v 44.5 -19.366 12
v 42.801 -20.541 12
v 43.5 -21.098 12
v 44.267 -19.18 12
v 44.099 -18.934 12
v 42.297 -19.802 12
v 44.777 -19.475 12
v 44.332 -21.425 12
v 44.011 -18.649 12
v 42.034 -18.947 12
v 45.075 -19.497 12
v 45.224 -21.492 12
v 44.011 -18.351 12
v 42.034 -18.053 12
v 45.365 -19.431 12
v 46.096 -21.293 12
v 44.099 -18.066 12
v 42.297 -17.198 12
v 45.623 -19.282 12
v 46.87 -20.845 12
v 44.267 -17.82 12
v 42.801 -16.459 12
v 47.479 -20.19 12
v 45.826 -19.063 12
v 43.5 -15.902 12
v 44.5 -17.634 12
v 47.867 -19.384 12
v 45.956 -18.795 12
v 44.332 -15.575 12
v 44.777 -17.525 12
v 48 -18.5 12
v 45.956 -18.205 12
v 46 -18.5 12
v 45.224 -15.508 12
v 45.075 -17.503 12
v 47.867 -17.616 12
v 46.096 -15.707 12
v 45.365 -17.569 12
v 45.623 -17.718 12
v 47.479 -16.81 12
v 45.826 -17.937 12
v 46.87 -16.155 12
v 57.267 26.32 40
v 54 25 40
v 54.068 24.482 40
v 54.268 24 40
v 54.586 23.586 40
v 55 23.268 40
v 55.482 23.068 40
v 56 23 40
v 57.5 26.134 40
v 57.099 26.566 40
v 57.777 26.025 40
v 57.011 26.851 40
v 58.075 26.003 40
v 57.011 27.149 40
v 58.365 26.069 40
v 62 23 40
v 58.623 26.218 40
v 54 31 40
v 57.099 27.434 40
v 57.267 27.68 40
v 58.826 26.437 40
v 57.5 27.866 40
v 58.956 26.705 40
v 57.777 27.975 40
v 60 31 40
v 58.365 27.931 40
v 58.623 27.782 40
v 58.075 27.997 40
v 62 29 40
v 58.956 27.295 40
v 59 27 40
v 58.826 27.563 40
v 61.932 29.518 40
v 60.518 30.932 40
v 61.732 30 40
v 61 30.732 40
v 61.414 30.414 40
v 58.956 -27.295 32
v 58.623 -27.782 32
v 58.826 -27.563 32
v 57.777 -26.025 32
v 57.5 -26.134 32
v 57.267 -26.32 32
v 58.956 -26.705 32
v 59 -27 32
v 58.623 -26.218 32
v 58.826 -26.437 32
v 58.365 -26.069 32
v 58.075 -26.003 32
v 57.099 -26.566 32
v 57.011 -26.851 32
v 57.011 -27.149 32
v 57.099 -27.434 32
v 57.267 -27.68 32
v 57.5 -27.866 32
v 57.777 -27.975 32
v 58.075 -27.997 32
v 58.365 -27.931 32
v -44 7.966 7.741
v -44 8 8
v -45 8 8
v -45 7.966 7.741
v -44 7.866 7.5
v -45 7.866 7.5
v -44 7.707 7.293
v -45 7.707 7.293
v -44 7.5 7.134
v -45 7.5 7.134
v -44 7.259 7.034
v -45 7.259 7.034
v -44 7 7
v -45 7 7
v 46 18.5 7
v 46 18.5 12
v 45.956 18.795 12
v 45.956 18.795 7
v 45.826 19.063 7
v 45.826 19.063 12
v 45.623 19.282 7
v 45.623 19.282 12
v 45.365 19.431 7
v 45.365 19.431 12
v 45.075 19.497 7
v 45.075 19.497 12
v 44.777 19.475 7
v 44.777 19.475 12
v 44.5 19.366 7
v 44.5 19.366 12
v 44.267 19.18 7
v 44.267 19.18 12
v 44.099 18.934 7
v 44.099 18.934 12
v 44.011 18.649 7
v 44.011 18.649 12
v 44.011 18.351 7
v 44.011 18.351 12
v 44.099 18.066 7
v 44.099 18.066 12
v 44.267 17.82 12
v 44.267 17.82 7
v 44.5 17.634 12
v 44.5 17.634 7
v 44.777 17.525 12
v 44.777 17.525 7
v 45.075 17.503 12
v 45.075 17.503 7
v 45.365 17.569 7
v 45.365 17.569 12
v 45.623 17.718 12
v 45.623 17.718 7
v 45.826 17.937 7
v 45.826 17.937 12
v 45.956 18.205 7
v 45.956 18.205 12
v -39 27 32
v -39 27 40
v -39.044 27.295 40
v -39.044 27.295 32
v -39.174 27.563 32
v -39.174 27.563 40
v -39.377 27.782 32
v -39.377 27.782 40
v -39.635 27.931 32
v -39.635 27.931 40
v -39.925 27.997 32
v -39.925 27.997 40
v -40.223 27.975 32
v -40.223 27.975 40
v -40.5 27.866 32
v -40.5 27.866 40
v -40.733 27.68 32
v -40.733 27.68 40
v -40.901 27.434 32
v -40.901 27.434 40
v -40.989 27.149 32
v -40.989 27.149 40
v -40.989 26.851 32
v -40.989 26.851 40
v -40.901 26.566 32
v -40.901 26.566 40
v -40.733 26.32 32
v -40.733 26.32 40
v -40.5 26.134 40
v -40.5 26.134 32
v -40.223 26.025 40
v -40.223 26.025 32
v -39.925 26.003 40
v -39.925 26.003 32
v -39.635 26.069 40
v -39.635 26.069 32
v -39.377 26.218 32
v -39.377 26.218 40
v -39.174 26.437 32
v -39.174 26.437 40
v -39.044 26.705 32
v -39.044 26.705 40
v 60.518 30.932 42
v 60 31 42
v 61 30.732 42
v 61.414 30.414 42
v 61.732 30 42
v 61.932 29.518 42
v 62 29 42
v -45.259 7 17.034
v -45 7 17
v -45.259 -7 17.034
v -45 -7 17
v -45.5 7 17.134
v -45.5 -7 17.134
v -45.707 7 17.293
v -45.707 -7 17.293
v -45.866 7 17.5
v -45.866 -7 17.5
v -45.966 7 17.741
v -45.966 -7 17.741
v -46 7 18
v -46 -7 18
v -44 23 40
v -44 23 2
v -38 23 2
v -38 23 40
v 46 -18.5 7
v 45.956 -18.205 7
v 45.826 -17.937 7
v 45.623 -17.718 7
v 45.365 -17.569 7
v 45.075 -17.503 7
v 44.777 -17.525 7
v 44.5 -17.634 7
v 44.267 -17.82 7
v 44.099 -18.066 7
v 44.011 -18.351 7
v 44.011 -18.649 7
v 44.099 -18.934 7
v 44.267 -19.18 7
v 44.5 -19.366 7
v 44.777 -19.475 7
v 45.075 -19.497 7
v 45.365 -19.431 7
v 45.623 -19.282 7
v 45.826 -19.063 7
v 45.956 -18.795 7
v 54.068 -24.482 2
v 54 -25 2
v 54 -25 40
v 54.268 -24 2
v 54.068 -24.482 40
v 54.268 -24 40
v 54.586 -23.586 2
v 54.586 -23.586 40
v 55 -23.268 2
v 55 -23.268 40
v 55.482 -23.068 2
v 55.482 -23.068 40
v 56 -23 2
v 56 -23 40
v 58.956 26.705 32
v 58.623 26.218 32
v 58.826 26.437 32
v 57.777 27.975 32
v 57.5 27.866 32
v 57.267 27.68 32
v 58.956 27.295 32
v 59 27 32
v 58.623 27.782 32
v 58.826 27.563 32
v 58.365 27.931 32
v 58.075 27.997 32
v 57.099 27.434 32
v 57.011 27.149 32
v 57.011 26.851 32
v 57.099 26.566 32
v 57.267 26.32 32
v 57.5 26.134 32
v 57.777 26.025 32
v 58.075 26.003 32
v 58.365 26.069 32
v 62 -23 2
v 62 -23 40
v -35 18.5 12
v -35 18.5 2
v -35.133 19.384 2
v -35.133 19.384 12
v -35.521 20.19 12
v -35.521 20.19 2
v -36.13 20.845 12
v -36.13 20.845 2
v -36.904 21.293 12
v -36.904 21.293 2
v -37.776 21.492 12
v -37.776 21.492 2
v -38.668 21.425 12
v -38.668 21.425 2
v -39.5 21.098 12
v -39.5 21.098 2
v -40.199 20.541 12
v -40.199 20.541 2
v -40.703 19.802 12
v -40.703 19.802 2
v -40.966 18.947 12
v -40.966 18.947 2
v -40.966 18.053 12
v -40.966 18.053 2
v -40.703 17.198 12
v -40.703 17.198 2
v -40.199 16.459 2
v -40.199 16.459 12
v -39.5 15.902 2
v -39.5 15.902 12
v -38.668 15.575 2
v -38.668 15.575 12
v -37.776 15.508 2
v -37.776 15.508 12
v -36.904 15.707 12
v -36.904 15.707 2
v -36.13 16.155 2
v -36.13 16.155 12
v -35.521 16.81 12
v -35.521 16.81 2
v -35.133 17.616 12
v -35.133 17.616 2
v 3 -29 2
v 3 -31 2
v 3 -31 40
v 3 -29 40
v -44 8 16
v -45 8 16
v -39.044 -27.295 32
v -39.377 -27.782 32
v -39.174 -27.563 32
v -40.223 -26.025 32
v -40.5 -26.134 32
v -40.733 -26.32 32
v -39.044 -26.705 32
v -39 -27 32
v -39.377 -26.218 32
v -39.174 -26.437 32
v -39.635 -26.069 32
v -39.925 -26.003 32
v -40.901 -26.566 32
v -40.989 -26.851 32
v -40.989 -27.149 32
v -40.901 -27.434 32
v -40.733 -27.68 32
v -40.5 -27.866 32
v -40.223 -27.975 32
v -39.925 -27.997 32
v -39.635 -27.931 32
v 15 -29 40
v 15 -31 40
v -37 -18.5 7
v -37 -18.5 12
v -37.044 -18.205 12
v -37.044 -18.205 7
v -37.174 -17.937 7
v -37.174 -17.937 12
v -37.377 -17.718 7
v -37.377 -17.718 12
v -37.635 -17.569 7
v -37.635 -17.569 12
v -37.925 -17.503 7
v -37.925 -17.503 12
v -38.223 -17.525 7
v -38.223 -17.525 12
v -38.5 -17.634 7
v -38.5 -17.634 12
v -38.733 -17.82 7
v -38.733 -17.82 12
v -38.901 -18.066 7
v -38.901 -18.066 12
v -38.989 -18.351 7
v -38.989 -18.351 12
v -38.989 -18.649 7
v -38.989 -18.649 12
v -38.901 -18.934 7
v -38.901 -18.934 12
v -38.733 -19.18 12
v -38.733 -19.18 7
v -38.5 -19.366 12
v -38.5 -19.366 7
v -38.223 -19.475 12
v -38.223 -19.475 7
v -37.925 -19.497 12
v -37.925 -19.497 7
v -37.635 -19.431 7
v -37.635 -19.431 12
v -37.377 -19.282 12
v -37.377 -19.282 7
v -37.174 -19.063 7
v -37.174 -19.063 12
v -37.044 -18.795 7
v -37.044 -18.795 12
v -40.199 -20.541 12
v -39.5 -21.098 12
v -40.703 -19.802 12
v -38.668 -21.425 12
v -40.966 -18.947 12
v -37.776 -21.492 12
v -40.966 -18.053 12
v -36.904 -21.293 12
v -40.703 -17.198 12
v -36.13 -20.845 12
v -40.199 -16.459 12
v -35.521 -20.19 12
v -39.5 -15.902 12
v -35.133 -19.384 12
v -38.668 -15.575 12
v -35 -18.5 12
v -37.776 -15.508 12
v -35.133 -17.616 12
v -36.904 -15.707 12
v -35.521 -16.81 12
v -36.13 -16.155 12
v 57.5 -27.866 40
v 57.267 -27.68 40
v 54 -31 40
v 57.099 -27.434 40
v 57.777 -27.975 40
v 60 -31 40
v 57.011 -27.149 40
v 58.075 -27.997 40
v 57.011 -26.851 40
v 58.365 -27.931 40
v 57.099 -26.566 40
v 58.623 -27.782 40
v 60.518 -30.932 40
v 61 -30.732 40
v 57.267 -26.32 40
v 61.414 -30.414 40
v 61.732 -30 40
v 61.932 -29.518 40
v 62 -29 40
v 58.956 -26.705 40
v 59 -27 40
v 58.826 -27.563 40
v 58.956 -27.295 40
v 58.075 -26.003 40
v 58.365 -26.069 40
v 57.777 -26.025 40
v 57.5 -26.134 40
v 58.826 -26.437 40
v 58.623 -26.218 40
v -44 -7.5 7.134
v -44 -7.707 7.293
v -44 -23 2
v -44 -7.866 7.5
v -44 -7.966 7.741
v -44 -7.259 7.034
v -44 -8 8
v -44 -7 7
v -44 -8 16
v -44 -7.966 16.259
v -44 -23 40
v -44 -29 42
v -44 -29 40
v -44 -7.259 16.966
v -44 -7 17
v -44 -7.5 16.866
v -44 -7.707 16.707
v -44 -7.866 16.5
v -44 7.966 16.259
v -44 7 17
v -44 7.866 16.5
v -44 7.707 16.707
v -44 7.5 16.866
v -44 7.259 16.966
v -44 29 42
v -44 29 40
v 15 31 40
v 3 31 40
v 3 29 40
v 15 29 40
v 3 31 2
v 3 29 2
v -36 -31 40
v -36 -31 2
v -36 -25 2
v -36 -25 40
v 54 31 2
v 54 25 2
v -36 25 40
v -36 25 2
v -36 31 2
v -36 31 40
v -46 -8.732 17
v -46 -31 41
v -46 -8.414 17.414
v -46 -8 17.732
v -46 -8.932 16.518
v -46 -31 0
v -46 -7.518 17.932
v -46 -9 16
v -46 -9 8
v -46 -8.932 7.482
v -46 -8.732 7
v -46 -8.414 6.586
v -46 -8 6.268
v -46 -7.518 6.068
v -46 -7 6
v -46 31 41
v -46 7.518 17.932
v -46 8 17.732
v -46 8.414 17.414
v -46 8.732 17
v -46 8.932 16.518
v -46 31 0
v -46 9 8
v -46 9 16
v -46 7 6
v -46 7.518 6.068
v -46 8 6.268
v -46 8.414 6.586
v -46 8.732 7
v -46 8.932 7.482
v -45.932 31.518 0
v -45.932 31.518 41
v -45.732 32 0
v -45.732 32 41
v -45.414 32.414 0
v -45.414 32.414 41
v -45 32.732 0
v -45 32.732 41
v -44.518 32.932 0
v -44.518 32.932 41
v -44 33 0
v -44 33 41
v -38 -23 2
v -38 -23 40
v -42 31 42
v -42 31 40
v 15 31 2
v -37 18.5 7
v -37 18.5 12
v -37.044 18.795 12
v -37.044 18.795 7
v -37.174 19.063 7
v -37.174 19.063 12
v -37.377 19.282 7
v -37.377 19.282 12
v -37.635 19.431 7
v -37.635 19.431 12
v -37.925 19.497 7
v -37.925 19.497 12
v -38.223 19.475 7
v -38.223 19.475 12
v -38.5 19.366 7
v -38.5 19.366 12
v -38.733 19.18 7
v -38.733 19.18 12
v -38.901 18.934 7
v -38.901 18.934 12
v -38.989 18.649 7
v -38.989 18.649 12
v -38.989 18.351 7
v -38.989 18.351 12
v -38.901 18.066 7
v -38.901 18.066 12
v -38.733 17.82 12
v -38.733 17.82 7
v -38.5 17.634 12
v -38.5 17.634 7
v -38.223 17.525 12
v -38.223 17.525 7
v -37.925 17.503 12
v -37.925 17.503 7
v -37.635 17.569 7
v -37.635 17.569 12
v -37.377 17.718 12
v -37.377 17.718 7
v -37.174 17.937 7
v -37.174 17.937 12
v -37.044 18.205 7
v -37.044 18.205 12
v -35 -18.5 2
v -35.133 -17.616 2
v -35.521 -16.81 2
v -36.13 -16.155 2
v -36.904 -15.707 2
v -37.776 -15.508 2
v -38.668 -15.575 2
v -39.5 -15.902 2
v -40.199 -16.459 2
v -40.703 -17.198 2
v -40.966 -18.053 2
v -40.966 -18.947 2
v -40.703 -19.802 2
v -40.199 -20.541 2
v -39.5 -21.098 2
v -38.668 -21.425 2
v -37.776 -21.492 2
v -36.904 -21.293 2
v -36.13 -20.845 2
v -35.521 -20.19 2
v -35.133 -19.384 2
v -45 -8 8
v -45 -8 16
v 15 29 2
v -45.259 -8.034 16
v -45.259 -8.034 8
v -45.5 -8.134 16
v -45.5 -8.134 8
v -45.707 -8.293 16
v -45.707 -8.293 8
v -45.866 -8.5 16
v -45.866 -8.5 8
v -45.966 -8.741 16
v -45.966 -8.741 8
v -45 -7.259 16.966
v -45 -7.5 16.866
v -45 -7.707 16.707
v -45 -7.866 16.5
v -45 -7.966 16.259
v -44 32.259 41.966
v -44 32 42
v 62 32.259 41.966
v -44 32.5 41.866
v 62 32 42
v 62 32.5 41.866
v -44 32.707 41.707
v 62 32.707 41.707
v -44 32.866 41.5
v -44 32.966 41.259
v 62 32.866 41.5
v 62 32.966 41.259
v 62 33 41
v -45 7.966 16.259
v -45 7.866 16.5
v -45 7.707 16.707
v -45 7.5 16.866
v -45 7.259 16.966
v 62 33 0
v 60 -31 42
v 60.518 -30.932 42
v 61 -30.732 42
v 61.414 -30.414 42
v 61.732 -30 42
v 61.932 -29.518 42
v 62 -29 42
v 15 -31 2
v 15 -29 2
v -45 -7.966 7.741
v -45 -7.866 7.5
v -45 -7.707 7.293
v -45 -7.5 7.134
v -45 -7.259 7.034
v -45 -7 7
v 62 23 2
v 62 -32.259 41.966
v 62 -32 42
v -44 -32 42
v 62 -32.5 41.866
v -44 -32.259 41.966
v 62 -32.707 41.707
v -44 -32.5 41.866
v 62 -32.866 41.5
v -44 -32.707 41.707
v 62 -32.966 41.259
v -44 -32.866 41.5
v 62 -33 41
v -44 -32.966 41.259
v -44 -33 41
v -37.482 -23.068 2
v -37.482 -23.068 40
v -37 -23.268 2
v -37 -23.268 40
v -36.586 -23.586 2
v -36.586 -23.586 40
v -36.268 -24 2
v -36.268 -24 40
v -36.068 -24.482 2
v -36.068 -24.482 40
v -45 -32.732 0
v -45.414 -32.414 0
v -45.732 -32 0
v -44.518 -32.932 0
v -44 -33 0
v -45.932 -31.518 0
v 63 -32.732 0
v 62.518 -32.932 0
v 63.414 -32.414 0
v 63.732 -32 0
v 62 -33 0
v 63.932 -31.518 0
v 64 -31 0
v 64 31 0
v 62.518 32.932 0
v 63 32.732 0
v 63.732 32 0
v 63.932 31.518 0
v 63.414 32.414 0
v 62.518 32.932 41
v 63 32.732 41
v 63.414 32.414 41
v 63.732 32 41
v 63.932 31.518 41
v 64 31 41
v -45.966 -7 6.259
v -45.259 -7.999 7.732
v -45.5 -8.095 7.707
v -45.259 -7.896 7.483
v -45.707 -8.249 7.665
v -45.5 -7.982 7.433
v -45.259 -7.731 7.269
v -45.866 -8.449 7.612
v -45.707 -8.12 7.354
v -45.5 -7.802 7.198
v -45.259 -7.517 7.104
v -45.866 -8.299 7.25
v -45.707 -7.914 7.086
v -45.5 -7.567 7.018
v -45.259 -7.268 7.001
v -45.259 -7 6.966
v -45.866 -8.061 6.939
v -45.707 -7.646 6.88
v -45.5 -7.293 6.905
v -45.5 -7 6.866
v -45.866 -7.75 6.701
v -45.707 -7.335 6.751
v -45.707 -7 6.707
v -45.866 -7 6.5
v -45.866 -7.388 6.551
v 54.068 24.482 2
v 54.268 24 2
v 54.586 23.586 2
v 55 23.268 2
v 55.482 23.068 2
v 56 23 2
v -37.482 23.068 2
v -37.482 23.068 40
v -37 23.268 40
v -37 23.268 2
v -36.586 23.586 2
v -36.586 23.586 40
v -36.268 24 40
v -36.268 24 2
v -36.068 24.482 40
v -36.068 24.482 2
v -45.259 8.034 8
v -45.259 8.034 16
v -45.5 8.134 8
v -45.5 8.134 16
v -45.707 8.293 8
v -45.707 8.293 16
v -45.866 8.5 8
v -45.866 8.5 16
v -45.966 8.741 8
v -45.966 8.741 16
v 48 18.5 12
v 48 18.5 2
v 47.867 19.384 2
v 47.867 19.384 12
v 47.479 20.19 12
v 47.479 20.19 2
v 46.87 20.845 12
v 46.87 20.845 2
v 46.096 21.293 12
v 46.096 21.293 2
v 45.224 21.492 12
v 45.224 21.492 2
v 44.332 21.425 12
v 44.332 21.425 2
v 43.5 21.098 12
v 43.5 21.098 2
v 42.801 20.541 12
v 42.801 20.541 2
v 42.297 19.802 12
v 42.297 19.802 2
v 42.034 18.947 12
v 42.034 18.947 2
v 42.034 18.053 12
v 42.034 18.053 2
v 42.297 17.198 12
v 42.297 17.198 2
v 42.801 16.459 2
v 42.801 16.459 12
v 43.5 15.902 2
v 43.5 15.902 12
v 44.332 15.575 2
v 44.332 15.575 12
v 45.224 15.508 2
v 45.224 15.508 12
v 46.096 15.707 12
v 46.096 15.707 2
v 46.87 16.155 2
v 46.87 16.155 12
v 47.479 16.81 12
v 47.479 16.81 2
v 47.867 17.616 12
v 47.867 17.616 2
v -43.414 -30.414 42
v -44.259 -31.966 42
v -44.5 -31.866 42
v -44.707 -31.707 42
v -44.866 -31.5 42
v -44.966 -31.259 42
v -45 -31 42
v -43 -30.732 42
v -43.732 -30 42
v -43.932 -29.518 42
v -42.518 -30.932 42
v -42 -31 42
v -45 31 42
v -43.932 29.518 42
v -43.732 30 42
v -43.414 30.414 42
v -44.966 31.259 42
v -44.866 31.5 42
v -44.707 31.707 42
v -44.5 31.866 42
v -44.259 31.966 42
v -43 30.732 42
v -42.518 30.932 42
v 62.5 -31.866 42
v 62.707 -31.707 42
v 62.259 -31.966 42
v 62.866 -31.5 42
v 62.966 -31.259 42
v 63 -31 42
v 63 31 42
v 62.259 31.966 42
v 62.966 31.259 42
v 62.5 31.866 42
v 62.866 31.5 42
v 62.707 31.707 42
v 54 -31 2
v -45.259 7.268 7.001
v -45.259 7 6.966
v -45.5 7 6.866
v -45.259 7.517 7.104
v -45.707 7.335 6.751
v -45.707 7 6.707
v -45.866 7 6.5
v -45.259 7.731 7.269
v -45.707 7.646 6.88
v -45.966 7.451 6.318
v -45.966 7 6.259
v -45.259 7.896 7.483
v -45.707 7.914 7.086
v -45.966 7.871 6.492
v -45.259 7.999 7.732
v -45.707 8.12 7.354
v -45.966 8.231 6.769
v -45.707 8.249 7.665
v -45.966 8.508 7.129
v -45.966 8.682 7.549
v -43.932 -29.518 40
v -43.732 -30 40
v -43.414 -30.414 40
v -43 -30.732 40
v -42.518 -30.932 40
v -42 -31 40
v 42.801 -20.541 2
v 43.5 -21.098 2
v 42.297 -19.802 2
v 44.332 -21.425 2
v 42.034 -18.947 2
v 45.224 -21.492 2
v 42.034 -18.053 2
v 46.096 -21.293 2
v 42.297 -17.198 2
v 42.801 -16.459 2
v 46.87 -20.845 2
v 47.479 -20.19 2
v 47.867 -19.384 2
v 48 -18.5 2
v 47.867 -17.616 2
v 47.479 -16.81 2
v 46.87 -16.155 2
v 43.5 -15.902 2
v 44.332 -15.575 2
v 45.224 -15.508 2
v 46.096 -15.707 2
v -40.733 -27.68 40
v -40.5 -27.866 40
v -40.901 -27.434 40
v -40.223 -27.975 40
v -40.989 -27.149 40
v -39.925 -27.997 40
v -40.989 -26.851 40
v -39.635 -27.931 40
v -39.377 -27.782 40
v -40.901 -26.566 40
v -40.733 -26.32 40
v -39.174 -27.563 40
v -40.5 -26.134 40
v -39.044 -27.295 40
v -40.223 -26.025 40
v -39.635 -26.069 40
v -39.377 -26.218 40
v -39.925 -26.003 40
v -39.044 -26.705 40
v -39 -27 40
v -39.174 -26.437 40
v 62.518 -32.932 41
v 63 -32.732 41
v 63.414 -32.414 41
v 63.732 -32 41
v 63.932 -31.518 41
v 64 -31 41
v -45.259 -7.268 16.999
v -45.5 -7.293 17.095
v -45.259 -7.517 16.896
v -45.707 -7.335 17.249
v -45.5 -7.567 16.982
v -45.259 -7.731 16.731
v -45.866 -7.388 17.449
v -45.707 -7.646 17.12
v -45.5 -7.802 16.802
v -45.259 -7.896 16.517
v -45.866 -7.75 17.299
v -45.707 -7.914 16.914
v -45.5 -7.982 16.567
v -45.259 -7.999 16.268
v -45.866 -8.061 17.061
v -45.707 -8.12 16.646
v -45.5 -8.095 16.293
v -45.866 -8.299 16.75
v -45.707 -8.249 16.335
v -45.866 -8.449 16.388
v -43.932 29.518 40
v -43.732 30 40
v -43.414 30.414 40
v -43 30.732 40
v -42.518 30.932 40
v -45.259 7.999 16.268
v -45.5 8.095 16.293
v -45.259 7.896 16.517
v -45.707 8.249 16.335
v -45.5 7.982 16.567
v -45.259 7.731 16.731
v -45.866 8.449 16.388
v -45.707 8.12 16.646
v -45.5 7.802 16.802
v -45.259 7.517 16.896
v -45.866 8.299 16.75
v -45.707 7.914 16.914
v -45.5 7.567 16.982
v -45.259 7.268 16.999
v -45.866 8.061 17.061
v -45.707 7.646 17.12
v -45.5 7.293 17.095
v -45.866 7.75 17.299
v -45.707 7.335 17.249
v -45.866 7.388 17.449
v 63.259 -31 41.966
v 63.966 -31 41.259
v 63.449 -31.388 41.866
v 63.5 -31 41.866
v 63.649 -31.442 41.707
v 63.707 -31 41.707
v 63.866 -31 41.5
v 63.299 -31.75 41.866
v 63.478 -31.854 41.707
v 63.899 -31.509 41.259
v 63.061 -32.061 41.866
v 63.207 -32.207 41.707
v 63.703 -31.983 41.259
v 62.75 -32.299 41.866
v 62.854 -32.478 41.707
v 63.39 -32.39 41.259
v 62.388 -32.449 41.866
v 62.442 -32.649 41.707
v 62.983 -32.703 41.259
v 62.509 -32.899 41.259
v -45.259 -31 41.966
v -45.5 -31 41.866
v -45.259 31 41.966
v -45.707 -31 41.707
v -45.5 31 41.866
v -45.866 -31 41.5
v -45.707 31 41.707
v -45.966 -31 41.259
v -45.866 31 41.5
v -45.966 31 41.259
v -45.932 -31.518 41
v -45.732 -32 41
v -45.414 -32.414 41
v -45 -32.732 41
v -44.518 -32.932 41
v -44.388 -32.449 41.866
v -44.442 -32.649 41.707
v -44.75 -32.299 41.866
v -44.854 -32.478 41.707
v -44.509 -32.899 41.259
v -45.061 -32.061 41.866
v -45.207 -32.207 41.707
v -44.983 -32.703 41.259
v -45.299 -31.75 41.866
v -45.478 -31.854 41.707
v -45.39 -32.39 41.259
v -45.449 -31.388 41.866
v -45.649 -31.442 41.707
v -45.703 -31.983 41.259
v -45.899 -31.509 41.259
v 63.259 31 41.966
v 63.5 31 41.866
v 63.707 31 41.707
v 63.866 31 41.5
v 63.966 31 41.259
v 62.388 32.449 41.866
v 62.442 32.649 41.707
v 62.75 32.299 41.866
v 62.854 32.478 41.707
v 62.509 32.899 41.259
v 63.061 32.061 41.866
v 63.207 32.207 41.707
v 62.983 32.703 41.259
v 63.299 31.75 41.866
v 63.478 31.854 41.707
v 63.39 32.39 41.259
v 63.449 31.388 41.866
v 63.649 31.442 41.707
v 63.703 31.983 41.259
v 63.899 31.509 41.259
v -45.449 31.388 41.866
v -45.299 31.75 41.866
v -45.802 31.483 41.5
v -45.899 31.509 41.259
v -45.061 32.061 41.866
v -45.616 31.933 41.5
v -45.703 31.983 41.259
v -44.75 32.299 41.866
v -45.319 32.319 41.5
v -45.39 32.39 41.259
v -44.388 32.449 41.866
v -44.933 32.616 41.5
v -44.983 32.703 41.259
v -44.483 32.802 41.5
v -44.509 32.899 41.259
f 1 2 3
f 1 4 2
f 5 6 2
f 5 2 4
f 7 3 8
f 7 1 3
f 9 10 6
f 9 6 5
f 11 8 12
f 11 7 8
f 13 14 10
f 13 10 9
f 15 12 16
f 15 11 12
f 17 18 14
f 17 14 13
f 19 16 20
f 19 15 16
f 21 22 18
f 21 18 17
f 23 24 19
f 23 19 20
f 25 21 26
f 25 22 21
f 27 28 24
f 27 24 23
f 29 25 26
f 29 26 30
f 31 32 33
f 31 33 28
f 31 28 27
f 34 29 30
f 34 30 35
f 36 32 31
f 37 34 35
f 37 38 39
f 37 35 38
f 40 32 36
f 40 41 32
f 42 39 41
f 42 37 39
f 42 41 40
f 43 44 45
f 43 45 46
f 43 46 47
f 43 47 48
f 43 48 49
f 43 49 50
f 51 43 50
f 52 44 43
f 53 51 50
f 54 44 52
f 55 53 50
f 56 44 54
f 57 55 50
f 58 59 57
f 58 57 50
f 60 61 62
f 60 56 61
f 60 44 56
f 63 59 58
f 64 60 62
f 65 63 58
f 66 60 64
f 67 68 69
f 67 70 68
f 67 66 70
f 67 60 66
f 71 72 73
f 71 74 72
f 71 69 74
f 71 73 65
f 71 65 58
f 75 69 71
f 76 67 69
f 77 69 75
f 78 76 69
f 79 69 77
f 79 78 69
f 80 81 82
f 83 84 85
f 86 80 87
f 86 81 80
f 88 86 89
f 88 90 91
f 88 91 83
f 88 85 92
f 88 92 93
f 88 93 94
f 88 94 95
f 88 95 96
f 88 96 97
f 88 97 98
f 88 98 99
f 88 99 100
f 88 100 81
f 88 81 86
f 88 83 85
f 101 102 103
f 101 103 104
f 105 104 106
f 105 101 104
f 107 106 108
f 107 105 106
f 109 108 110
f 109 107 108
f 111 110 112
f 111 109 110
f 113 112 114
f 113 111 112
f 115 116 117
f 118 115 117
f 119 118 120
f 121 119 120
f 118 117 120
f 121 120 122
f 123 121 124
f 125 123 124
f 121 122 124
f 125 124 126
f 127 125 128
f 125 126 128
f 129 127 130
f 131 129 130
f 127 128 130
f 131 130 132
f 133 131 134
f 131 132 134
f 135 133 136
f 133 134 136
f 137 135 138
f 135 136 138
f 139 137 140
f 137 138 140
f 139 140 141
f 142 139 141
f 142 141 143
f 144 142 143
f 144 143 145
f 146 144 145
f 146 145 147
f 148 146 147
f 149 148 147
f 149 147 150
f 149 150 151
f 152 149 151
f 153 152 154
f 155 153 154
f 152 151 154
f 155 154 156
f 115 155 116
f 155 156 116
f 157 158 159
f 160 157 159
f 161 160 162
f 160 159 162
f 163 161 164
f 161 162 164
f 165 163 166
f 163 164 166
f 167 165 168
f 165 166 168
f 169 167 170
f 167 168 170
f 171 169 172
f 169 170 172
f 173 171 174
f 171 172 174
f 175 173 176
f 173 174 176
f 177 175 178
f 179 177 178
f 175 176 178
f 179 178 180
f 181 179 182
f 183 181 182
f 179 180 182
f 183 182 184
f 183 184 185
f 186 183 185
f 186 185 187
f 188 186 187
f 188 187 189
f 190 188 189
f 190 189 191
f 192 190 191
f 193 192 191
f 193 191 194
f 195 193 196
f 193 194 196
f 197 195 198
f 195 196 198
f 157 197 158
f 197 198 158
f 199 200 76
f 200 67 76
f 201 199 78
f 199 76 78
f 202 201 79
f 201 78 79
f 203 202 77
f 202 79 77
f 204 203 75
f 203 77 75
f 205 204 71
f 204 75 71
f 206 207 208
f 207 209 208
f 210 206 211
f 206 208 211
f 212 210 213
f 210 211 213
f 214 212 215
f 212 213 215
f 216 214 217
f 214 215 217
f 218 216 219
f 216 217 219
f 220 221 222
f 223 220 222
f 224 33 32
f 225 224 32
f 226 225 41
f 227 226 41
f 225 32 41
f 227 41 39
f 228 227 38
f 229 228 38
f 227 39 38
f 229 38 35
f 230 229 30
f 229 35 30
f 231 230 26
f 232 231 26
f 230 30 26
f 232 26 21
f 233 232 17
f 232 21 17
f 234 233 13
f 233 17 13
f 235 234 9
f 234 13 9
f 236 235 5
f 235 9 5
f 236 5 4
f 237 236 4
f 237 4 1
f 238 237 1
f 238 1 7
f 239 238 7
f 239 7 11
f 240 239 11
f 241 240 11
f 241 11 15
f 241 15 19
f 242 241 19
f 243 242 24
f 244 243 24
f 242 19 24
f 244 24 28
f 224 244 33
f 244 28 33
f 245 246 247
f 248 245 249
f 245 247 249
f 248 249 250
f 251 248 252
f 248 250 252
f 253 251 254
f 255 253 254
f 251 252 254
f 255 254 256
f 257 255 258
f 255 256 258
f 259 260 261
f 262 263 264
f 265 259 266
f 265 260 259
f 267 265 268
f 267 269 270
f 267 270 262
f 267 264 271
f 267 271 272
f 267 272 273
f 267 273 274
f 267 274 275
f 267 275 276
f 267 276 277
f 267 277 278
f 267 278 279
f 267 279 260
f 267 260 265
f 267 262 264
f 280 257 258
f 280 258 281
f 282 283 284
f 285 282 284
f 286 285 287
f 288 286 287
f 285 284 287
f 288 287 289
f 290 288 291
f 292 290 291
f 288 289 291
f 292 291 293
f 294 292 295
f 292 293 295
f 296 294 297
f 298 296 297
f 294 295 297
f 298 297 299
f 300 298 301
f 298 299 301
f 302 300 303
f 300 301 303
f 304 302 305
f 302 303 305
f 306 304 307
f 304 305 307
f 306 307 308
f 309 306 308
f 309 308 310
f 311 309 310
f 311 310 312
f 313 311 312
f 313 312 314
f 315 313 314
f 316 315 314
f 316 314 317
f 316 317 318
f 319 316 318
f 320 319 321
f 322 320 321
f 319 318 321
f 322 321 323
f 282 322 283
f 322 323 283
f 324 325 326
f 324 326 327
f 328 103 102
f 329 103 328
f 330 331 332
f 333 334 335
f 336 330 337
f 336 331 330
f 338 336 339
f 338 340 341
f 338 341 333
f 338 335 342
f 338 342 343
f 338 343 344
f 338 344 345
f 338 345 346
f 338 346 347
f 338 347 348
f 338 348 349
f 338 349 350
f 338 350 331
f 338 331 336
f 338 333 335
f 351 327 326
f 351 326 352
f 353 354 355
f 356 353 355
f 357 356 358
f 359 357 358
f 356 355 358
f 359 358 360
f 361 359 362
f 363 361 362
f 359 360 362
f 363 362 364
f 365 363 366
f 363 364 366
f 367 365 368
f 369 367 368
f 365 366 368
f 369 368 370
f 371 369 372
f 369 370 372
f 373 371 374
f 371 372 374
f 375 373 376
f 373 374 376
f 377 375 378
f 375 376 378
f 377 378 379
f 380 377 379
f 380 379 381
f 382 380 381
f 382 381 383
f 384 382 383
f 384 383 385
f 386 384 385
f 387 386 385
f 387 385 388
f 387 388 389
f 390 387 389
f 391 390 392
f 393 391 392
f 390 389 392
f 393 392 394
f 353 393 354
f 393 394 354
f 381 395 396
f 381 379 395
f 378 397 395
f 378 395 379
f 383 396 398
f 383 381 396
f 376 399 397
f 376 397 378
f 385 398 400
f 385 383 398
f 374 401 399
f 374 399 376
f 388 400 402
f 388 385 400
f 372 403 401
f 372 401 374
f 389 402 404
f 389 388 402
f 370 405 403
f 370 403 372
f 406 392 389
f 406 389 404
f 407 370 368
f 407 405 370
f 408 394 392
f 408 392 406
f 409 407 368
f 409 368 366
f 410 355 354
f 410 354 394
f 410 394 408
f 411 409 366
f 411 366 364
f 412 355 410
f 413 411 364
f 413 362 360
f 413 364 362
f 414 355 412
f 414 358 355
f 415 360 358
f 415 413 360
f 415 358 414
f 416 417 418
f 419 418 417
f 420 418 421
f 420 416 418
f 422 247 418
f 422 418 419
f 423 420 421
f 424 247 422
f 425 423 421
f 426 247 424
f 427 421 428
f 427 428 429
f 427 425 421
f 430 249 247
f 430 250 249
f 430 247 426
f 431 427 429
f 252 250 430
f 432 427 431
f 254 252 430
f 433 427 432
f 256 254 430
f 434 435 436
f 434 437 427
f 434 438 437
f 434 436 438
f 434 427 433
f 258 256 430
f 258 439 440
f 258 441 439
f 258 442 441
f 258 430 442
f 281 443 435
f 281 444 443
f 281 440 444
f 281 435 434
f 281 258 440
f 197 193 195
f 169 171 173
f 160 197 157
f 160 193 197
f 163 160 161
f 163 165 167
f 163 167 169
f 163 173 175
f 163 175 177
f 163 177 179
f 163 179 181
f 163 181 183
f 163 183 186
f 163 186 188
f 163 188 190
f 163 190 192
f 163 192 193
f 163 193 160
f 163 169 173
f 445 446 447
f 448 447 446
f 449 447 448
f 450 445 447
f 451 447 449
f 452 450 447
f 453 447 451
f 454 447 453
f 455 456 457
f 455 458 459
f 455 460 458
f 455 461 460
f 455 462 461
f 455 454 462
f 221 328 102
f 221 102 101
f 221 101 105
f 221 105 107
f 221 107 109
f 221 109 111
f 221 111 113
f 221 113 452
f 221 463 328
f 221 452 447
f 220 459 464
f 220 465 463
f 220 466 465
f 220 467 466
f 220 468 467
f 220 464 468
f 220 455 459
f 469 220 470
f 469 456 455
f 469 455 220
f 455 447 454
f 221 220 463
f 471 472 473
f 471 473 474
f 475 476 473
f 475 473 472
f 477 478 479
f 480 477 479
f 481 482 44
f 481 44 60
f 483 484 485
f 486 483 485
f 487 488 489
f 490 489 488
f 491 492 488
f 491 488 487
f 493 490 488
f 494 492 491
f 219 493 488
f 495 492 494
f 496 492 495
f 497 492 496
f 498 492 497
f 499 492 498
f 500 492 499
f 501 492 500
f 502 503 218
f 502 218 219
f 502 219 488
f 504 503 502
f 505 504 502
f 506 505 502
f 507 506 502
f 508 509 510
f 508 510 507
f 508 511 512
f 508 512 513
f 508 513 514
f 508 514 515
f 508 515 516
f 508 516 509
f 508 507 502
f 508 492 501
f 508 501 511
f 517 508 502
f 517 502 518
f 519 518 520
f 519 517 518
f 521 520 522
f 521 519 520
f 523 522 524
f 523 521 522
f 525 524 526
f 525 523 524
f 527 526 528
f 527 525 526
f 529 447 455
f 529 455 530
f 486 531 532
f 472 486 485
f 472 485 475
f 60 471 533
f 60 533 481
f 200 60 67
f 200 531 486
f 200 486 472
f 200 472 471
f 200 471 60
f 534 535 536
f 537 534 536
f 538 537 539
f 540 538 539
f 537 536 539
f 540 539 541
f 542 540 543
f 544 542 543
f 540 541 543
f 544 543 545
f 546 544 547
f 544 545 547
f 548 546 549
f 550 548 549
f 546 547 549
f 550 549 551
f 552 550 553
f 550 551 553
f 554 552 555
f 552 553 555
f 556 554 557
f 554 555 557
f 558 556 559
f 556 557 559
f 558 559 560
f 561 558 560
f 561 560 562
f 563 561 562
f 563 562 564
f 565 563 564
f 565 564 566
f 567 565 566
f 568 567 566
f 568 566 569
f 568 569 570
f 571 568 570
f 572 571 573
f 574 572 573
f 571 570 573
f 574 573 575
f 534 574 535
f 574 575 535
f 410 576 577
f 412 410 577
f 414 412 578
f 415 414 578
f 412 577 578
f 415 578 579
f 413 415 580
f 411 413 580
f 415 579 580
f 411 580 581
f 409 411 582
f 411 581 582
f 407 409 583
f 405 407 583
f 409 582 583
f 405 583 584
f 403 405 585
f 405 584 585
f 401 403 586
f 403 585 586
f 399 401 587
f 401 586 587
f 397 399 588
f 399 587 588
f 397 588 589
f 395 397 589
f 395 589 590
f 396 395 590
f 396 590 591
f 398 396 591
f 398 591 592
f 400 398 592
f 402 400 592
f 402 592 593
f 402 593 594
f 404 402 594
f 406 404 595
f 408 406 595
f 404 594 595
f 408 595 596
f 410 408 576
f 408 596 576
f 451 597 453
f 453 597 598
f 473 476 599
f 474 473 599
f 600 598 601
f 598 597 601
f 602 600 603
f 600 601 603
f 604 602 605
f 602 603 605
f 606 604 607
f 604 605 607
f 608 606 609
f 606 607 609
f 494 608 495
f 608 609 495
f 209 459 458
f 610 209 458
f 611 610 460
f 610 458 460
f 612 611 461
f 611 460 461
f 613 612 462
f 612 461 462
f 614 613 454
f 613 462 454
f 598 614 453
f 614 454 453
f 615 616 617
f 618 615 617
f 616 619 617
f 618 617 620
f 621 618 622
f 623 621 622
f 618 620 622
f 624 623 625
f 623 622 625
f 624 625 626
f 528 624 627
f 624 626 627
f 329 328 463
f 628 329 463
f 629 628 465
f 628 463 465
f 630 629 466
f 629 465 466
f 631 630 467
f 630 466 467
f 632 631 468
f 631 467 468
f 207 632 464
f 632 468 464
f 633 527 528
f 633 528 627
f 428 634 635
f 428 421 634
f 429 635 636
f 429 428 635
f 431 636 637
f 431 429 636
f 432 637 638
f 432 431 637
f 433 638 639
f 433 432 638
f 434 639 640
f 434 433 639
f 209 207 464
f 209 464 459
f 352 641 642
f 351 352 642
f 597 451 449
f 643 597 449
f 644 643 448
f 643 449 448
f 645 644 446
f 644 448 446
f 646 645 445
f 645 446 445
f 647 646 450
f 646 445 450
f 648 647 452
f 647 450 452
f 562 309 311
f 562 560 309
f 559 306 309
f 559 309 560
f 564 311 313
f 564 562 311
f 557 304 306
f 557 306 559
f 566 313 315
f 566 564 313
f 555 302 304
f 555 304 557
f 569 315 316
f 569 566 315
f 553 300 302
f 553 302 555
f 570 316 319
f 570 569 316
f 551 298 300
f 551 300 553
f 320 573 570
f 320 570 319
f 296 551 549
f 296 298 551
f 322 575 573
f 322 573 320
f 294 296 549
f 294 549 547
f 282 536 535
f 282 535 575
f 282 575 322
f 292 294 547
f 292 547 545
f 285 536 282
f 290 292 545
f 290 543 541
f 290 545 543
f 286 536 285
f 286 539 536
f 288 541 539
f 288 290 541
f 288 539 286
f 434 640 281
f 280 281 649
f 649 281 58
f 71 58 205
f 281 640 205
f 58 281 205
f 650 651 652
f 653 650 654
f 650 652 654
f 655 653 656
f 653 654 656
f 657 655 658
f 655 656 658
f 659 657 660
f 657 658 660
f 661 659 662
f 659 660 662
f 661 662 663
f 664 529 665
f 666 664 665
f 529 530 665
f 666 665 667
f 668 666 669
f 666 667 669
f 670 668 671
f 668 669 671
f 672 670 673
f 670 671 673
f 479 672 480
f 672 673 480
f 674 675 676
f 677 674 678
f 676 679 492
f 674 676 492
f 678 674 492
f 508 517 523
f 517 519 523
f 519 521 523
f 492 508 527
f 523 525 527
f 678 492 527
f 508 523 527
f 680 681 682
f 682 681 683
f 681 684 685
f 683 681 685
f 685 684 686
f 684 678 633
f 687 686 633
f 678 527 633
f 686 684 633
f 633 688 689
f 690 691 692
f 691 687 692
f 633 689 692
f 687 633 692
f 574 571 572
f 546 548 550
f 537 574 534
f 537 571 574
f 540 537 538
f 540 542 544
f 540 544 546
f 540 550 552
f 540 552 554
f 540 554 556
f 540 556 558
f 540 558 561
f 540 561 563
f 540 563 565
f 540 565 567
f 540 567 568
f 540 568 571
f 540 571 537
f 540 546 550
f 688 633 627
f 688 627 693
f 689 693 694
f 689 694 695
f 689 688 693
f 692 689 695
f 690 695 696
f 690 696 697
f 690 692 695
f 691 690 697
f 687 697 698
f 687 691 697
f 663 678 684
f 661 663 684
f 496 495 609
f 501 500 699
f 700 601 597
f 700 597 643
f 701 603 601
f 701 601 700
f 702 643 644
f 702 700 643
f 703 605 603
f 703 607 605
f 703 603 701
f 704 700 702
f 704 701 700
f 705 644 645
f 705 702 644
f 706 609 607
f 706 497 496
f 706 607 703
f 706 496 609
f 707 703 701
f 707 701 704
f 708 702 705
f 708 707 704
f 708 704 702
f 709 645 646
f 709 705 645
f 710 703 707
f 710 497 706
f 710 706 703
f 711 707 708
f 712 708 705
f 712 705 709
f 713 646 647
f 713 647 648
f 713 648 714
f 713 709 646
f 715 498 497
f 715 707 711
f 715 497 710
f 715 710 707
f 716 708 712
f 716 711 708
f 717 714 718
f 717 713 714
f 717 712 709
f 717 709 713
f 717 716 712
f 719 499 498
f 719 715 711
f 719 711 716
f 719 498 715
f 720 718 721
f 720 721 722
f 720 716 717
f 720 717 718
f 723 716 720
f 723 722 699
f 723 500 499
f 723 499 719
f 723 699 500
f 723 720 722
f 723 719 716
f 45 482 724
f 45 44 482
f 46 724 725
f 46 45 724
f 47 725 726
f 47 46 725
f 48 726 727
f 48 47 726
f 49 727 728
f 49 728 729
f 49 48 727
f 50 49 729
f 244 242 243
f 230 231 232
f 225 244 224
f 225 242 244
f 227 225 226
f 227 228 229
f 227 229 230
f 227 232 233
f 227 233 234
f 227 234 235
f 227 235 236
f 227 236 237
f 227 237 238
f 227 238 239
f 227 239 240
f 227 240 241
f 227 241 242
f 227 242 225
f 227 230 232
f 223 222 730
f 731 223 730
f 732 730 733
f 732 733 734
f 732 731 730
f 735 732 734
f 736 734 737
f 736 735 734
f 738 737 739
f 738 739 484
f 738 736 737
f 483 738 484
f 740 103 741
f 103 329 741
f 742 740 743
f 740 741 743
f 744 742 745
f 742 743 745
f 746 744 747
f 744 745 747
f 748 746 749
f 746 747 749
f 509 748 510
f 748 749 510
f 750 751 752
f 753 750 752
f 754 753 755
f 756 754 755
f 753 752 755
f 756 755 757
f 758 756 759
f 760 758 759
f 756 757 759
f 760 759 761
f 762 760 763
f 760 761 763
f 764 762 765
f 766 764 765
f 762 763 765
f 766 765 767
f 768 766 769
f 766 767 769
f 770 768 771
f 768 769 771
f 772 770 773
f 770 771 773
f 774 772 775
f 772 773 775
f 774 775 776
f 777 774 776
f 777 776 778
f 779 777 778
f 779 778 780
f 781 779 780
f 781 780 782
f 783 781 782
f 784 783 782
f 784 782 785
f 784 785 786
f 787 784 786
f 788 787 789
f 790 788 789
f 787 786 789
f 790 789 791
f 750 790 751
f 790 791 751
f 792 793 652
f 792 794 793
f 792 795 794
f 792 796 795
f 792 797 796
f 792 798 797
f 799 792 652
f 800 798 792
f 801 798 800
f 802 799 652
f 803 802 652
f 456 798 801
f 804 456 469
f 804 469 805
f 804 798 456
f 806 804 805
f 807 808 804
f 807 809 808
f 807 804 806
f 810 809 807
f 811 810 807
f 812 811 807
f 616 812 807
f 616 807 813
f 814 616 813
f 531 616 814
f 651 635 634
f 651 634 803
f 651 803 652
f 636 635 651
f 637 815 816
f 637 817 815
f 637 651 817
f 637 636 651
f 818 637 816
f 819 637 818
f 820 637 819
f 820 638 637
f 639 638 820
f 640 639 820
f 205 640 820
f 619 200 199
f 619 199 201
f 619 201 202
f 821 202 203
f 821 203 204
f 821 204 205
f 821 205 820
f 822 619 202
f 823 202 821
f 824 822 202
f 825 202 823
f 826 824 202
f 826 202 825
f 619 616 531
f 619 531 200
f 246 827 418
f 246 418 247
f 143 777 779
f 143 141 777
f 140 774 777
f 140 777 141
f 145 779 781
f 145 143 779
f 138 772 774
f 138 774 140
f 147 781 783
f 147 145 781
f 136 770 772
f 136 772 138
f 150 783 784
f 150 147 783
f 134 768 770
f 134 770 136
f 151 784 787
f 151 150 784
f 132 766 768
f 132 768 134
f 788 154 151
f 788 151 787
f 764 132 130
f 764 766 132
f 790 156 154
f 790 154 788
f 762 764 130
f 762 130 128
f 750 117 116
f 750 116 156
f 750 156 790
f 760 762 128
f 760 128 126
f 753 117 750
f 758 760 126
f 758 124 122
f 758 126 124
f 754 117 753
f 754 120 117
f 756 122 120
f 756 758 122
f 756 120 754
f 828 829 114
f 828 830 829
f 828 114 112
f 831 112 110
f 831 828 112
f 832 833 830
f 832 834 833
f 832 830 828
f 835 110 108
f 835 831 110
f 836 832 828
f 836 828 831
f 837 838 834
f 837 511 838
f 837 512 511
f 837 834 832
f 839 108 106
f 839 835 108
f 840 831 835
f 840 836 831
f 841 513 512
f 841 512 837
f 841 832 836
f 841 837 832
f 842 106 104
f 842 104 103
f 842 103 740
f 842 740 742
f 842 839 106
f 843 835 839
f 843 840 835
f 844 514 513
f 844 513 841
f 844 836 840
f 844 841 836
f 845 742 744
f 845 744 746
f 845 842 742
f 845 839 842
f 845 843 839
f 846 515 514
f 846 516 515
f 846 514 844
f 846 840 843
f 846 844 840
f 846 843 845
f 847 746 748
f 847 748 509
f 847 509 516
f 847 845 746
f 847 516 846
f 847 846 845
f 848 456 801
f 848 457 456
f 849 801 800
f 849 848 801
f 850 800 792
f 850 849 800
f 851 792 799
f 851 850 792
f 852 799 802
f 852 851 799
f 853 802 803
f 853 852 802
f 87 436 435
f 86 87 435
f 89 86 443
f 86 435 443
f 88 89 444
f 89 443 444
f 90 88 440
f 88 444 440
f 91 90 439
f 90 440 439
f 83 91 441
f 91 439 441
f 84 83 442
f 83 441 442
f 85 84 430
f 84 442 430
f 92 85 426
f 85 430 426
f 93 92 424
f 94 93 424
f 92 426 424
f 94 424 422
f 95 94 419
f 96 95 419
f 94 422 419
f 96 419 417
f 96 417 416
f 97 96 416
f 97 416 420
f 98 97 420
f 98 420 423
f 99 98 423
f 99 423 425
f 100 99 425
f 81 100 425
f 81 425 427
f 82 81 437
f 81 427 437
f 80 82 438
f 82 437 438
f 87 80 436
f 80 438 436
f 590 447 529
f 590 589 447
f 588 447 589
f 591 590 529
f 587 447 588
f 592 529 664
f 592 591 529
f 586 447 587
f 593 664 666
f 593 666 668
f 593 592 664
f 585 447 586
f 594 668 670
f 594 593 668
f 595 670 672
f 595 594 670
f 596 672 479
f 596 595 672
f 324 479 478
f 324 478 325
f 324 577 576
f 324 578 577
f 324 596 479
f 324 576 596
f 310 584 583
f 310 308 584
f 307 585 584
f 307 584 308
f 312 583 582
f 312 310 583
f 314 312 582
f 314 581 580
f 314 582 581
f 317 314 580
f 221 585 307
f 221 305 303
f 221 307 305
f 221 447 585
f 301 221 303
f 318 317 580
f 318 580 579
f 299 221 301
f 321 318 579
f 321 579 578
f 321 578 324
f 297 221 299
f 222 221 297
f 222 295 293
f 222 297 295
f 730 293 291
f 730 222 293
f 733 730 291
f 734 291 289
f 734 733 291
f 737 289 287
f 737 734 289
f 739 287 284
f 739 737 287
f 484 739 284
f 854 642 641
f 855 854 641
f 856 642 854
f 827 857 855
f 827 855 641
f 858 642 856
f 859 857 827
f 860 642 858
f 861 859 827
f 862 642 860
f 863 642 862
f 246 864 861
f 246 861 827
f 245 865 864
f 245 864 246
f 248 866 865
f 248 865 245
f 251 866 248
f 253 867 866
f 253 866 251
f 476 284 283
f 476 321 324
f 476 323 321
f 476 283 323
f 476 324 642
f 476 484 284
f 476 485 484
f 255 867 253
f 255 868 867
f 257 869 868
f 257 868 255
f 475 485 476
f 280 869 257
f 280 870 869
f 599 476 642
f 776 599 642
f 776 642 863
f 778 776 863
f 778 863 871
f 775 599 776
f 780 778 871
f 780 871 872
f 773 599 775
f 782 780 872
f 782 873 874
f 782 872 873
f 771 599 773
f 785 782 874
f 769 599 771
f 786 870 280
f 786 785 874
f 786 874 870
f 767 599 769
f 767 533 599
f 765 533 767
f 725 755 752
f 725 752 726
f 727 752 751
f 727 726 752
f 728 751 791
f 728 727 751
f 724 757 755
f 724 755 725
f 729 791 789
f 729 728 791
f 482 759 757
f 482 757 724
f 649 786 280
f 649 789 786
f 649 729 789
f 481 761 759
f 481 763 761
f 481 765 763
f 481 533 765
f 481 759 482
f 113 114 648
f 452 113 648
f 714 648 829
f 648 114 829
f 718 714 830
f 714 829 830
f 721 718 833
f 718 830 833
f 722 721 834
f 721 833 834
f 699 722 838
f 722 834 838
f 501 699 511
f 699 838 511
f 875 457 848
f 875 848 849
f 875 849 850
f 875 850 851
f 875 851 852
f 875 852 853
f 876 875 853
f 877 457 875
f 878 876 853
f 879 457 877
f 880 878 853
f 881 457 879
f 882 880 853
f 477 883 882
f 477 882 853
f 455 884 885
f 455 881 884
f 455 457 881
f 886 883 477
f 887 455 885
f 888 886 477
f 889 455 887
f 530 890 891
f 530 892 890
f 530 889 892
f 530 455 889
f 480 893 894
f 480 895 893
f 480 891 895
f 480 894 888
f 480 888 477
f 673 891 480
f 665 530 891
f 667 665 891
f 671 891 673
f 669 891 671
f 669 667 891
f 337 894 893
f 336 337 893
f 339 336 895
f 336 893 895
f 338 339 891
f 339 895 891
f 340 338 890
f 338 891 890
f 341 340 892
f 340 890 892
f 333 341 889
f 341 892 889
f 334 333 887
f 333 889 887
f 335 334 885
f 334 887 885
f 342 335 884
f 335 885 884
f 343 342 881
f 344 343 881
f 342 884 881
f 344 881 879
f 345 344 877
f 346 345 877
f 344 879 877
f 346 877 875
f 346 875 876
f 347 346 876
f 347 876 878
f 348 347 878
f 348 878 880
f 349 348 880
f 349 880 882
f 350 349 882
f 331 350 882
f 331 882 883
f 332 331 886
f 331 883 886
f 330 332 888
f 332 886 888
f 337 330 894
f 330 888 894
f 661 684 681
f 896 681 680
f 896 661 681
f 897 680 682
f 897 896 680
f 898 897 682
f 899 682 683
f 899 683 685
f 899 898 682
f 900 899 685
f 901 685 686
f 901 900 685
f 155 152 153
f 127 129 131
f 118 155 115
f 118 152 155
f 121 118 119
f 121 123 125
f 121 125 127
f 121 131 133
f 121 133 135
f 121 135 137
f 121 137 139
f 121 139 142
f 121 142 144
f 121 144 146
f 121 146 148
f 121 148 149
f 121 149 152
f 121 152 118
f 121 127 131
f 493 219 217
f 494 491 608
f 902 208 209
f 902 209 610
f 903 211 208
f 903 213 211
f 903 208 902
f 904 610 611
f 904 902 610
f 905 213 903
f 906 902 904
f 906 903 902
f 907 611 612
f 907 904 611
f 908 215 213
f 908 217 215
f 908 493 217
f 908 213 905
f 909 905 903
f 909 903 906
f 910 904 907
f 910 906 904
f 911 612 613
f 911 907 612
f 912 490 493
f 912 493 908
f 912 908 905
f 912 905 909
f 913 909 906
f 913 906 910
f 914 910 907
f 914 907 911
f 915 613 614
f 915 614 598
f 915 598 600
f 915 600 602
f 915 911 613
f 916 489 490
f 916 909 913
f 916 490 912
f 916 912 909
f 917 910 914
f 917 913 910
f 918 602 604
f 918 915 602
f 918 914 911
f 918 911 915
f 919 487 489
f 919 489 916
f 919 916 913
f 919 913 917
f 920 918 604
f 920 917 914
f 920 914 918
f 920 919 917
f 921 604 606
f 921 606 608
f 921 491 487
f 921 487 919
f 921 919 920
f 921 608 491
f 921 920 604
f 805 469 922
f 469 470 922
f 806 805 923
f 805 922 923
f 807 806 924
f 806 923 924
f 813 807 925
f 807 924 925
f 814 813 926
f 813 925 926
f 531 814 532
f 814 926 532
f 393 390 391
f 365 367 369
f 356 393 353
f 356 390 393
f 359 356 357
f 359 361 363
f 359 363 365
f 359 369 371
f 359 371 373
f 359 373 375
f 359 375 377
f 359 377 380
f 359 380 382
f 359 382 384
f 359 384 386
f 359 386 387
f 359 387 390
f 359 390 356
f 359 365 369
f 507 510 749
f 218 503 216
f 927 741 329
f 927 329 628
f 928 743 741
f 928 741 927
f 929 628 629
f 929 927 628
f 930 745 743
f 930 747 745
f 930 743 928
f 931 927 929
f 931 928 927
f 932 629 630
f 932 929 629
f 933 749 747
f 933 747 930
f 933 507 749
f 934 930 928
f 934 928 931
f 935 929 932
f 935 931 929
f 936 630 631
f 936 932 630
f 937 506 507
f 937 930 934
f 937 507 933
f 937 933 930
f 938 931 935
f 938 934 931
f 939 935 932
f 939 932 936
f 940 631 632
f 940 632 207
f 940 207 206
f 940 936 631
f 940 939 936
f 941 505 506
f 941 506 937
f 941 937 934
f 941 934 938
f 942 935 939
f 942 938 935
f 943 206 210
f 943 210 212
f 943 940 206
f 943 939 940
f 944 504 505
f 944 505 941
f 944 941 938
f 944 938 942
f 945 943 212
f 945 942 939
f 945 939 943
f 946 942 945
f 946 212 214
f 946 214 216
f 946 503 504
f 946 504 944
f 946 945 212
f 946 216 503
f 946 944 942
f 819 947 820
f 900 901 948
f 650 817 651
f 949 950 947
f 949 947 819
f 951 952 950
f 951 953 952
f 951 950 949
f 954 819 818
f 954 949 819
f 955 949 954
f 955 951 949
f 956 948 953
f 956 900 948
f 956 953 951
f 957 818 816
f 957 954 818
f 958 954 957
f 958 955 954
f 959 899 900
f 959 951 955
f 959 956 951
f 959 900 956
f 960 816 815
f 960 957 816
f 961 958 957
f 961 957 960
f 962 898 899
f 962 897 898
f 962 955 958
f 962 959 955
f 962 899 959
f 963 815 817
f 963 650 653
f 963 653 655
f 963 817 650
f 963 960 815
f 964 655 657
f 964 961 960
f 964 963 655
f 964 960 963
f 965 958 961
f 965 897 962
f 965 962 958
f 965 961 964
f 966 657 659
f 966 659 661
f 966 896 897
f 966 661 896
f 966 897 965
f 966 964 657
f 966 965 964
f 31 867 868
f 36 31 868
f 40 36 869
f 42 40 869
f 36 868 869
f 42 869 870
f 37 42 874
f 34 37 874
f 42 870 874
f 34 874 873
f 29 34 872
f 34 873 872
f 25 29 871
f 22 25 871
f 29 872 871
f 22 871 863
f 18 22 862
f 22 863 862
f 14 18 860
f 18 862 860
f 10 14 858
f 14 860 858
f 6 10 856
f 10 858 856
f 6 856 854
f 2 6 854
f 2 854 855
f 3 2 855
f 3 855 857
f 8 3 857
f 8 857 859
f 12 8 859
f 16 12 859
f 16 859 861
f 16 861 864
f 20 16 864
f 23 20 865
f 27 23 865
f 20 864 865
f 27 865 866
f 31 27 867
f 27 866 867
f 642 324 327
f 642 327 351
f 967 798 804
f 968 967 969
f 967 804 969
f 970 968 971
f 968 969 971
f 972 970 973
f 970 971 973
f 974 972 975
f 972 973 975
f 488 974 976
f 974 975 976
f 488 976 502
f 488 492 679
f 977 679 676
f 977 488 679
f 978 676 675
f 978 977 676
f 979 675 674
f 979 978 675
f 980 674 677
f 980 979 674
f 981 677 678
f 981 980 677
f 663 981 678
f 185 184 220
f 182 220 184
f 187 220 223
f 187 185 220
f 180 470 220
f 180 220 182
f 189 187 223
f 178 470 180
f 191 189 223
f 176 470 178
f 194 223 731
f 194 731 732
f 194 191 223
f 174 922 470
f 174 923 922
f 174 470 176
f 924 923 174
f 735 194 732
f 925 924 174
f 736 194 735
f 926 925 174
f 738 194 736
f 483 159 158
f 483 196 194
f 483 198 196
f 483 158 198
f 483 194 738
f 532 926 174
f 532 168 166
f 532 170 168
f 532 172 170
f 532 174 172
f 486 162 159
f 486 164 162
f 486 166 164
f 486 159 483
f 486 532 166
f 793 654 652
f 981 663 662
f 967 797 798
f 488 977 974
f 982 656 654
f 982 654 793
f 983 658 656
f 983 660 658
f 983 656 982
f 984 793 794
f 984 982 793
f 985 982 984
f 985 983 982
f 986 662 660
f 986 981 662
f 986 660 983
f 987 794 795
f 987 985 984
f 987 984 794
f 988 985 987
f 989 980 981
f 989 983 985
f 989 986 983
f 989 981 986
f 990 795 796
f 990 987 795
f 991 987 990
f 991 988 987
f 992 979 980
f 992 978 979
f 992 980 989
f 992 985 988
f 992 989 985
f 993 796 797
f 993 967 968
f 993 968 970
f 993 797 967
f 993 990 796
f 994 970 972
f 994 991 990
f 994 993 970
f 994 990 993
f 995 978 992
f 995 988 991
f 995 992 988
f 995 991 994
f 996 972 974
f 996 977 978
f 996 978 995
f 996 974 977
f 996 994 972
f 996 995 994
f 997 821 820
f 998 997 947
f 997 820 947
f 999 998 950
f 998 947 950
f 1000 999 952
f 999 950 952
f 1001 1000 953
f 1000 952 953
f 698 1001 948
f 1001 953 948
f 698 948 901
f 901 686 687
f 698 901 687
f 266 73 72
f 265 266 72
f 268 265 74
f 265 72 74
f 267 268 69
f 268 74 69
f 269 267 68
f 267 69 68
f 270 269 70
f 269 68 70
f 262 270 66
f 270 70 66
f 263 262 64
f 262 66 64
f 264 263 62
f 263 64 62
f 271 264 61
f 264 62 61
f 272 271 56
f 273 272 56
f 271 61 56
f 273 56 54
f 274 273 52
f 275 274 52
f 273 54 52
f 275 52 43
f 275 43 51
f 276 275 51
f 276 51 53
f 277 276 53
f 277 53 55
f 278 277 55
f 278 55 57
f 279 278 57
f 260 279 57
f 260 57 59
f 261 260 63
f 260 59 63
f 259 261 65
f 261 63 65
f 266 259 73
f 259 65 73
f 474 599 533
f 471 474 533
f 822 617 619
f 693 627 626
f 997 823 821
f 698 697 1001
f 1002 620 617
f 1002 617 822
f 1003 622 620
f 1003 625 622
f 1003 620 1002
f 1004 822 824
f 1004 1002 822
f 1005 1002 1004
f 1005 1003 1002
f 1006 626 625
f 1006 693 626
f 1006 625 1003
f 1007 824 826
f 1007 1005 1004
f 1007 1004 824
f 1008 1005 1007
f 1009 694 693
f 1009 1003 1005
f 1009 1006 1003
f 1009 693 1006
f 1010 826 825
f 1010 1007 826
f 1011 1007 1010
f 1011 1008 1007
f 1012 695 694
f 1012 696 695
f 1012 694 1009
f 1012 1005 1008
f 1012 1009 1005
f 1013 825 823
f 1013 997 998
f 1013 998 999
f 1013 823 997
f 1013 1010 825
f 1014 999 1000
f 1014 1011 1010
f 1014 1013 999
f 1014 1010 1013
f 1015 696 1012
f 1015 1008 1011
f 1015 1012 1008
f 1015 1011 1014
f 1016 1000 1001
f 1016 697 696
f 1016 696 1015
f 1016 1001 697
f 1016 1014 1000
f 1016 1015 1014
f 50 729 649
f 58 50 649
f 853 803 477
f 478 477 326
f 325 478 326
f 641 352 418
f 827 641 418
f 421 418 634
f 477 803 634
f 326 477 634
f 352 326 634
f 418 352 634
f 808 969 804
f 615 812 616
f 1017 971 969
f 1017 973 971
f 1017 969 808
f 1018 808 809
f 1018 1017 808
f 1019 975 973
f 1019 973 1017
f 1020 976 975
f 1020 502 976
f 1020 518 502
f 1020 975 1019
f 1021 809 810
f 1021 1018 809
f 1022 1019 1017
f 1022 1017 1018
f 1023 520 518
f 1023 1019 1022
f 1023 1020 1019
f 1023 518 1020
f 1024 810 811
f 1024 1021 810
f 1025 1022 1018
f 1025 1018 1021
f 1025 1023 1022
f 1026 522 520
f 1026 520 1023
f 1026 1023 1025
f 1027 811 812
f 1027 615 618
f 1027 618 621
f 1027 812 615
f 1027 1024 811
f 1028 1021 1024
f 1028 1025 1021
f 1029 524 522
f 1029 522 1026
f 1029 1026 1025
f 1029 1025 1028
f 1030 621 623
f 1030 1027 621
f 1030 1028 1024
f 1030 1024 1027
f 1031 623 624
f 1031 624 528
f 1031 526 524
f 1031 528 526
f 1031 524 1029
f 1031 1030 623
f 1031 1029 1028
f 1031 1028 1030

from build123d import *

# Parameters (mm, degrees)
SKETCH008_W     = 110
SKETCH008_H     = 66
PAD006_DEPTH    = 2
SKETCH010_W     = 110
SKETCH010_H     = 66
PAD008_DEPTH    = 40
SKETCH011_W     = 106
SKETCH011_H     = 62
POCKET003_DEPTH = 40
SKETCH012_W     = 8
SKETCH012_H     = 8
PAD009_DEPTH    = 38
FILLET_R        = 2
FILLET001_R     = 2
FILLET002_R     = 2
FILLET003_R     = 2
FILLET004_R     = 2
SKETCH009_R     = 3
PAD010_DEPTH    = 10
SKETCH013_W     = 16
SKETCH013_H     = 10
POCKET004_DEPTH = 2
SKETCH014_R     = 1
POCKET005_DEPTH = 8
FILLET005_R     = 1
FILLET006_R     = 1
FILLET007_R     = 2
SKETCH015_R     = 1
POCKET006_DEPTH = 5
FILLET008_R     = 1
SKETCH016_W     = 12
SKETCH016_H     = 2
PAD011_DEPTH    = 38


with BuildPart() as part:
    # Sketch008 → Pad006 (new body)
    with BuildSketch(Plane.XY):
        with Locations((9, 0)):
            Rectangle(SKETCH008_W, SKETCH008_H)
    extrude(amount=PAD006_DEPTH)

    # Sketch010 (on Face6 of Pad006) → Pad008 (join)
    with BuildSketch(Plane.XY.offset(2)):
        with Locations((9, 0)):
            Rectangle(SKETCH010_W, SKETCH010_H)
    extrude(amount=PAD008_DEPTH)

    # Sketch011 (on Face9 of Pad008) → Pocket003 (cut)
    with BuildSketch(Plane.XY.offset(42)):
        with Locations((9, 0)):
            Rectangle(SKETCH011_W, SKETCH011_H)
    extrude(amount=-POCKET003_DEPTH, mode=Mode.SUBTRACT)

    # Sketch012 (on Face15 of Pocket003) → Pad009 (join)
    with BuildSketch(Plane.XY.offset(2)):
        with Locations((-40, 27)):
            Rectangle(SKETCH012_W, SKETCH012_H)
        with Locations((58, 27)):
            Rectangle(SKETCH012_W, SKETCH012_H)
        with Locations((-40, -27)):
            Rectangle(SKETCH012_W, SKETCH012_H)
        with Locations((58, -27)):
            Rectangle(SKETCH012_W, SKETCH012_H)
    extrude(amount=PAD009_DEPTH)

    # Fillet
    fillet_edges = [part.edges().sort_by_distance(p)[0] for p in [
        (62, -31, 41),
    ]]
    fillet(fillet_edges, radius=FILLET_R)

    # Fillet001
    fillet001_edges = [part.edges().sort_by_distance(p)[0] for p in [
        (-44, 31, 41),
    ]]
    fillet(fillet001_edges, radius=FILLET001_R)

    # Fillet002
    fillet002_edges = [part.edges().sort_by_distance(p)[0] for p in [
        (62, 31, 41),
    ]]
    fillet(fillet002_edges, radius=FILLET002_R)

    # Fillet003
    fillet003_edges = [part.edges().sort_by_distance(p)[0] for p in [
        (-44, -31, 41),
    ]]
    fillet(fillet003_edges, radius=FILLET003_R)

    # Fillet004
    fillet004_edges = [part.edges().sort_by_distance(p)[0] for p in [
        (64, 33, 22),
        (64, -33, 22),
        (-46, -33, 22),
        (-46, 33, 22),
    ]]
    fillet(fillet004_edges, radius=FILLET004_R)

    # Sketch009 → Pad010 (join)
    with BuildSketch(Plane.XY.offset(2)):
        with Locations((-38, 18.5)):
            Circle(SKETCH009_R)
        with Locations((45, 18.5)):
            Circle(SKETCH009_R)
        with Locations((-38, -18.5)):
            Circle(SKETCH009_R)
        with Locations((45, -18.5)):
            Circle(SKETCH009_R)
    extrude(amount=PAD010_DEPTH)

    # Sketch013 (on Face5 of Pad010) → Pocket004 (cut)
    with BuildSketch(Plane(origin=(-46, 0, 0), x_dir=(0, -1, 0), z_dir=(-1, 0, 0))):
        with Locations((0, 12)):
            Rectangle(SKETCH013_W, SKETCH013_H)
    extrude(amount=-POCKET004_DEPTH, mode=Mode.SUBTRACT)

    # Sketch014 (on Face35 of Pocket004) → Pocket005 (cut)
    with BuildSketch(Plane.XY.offset(40)):
        with Locations((-40, 27)):
            Circle(SKETCH014_R)
        with Locations((58, 27)):
            Circle(SKETCH014_R)
        with Locations((-40, -27)):
            Circle(SKETCH014_R)
        with Locations((58, -27)):
            Circle(SKETCH014_R)
    extrude(amount=-POCKET005_DEPTH, mode=Mode.SUBTRACT)

    # Fillet005
    fillet005_edges = [part.edges().sort_by_distance(p)[0] for p in [
        (9, 33, 42),
        (63.414214, 32.414214, 42),
        (64, 0, 42),
        (-45.414214, 32.414214, 42),
        (-46, 0, 42),
        (-45.414214, -32.414214, 42),
        (9, -33, 42),
        (63.414214, -32.414214, 42),
    ]]
    fillet(fillet005_edges, radius=FILLET005_R)

    # Fillet006
    fillet006_edges = [part.edges().sort_by_distance(p)[0] for p in [
        (-45, -8, 17),
        (-45, 8, 7),
        (-45, 8, 17),
        (-45, -8, 7),
    ]]
    fillet(fillet006_edges, radius=FILLET006_R)

    # Fillet007
    fillet007_edges = [part.edges().sort_by_distance(p)[0] for p in [
        (54, 23, 21),
        (54, -23, 21),
        (-36, 23, 21),
        (-36, -23, 21),
    ]]
    fillet(fillet007_edges, radius=FILLET007_R)

    # Sketch015 (on Face55 of Fillet007) → Pocket006 (cut)
    with BuildSketch(Plane.XY.offset(12)):
        with Locations((-38, 18.5)):
            Circle(SKETCH015_R)
        with Locations((45, 18.5)):
            Circle(SKETCH015_R)
        with Locations((-38, -18.5)):
            Circle(SKETCH015_R)
        with Locations((45, -18.5)):
            Circle(SKETCH015_R)
    extrude(amount=-POCKET006_DEPTH, mode=Mode.SUBTRACT)

    # Fillet008
    fillet008_edges = [part.edges().sort_by_distance(p)[0] for p in [
        (-46, 8, 12),
        (-46, 7.707107, 7.292893),
        (-46, 7.707107, 16.707107),
        (-46, 0, 17),
        (-46, -7.707107, 16.707107),
        (-46, -8, 12),
        (-46, -7.707107, 7.292893),
        (-46, 0, 7),
    ]]
    fillet(fillet008_edges, radius=FILLET008_R)

    # Sketch016 (on Face21 of Fillet008) → Pad011 (join)
    with BuildSketch(Plane.XY.offset(2)):
        with Locations((9, 30)):
            Rectangle(SKETCH016_W, SKETCH016_H)
        with Locations((9, -30)):
            Rectangle(SKETCH016_W, SKETCH016_H)
    extrude(amount=PAD011_DEPTH)


solid = part.part
